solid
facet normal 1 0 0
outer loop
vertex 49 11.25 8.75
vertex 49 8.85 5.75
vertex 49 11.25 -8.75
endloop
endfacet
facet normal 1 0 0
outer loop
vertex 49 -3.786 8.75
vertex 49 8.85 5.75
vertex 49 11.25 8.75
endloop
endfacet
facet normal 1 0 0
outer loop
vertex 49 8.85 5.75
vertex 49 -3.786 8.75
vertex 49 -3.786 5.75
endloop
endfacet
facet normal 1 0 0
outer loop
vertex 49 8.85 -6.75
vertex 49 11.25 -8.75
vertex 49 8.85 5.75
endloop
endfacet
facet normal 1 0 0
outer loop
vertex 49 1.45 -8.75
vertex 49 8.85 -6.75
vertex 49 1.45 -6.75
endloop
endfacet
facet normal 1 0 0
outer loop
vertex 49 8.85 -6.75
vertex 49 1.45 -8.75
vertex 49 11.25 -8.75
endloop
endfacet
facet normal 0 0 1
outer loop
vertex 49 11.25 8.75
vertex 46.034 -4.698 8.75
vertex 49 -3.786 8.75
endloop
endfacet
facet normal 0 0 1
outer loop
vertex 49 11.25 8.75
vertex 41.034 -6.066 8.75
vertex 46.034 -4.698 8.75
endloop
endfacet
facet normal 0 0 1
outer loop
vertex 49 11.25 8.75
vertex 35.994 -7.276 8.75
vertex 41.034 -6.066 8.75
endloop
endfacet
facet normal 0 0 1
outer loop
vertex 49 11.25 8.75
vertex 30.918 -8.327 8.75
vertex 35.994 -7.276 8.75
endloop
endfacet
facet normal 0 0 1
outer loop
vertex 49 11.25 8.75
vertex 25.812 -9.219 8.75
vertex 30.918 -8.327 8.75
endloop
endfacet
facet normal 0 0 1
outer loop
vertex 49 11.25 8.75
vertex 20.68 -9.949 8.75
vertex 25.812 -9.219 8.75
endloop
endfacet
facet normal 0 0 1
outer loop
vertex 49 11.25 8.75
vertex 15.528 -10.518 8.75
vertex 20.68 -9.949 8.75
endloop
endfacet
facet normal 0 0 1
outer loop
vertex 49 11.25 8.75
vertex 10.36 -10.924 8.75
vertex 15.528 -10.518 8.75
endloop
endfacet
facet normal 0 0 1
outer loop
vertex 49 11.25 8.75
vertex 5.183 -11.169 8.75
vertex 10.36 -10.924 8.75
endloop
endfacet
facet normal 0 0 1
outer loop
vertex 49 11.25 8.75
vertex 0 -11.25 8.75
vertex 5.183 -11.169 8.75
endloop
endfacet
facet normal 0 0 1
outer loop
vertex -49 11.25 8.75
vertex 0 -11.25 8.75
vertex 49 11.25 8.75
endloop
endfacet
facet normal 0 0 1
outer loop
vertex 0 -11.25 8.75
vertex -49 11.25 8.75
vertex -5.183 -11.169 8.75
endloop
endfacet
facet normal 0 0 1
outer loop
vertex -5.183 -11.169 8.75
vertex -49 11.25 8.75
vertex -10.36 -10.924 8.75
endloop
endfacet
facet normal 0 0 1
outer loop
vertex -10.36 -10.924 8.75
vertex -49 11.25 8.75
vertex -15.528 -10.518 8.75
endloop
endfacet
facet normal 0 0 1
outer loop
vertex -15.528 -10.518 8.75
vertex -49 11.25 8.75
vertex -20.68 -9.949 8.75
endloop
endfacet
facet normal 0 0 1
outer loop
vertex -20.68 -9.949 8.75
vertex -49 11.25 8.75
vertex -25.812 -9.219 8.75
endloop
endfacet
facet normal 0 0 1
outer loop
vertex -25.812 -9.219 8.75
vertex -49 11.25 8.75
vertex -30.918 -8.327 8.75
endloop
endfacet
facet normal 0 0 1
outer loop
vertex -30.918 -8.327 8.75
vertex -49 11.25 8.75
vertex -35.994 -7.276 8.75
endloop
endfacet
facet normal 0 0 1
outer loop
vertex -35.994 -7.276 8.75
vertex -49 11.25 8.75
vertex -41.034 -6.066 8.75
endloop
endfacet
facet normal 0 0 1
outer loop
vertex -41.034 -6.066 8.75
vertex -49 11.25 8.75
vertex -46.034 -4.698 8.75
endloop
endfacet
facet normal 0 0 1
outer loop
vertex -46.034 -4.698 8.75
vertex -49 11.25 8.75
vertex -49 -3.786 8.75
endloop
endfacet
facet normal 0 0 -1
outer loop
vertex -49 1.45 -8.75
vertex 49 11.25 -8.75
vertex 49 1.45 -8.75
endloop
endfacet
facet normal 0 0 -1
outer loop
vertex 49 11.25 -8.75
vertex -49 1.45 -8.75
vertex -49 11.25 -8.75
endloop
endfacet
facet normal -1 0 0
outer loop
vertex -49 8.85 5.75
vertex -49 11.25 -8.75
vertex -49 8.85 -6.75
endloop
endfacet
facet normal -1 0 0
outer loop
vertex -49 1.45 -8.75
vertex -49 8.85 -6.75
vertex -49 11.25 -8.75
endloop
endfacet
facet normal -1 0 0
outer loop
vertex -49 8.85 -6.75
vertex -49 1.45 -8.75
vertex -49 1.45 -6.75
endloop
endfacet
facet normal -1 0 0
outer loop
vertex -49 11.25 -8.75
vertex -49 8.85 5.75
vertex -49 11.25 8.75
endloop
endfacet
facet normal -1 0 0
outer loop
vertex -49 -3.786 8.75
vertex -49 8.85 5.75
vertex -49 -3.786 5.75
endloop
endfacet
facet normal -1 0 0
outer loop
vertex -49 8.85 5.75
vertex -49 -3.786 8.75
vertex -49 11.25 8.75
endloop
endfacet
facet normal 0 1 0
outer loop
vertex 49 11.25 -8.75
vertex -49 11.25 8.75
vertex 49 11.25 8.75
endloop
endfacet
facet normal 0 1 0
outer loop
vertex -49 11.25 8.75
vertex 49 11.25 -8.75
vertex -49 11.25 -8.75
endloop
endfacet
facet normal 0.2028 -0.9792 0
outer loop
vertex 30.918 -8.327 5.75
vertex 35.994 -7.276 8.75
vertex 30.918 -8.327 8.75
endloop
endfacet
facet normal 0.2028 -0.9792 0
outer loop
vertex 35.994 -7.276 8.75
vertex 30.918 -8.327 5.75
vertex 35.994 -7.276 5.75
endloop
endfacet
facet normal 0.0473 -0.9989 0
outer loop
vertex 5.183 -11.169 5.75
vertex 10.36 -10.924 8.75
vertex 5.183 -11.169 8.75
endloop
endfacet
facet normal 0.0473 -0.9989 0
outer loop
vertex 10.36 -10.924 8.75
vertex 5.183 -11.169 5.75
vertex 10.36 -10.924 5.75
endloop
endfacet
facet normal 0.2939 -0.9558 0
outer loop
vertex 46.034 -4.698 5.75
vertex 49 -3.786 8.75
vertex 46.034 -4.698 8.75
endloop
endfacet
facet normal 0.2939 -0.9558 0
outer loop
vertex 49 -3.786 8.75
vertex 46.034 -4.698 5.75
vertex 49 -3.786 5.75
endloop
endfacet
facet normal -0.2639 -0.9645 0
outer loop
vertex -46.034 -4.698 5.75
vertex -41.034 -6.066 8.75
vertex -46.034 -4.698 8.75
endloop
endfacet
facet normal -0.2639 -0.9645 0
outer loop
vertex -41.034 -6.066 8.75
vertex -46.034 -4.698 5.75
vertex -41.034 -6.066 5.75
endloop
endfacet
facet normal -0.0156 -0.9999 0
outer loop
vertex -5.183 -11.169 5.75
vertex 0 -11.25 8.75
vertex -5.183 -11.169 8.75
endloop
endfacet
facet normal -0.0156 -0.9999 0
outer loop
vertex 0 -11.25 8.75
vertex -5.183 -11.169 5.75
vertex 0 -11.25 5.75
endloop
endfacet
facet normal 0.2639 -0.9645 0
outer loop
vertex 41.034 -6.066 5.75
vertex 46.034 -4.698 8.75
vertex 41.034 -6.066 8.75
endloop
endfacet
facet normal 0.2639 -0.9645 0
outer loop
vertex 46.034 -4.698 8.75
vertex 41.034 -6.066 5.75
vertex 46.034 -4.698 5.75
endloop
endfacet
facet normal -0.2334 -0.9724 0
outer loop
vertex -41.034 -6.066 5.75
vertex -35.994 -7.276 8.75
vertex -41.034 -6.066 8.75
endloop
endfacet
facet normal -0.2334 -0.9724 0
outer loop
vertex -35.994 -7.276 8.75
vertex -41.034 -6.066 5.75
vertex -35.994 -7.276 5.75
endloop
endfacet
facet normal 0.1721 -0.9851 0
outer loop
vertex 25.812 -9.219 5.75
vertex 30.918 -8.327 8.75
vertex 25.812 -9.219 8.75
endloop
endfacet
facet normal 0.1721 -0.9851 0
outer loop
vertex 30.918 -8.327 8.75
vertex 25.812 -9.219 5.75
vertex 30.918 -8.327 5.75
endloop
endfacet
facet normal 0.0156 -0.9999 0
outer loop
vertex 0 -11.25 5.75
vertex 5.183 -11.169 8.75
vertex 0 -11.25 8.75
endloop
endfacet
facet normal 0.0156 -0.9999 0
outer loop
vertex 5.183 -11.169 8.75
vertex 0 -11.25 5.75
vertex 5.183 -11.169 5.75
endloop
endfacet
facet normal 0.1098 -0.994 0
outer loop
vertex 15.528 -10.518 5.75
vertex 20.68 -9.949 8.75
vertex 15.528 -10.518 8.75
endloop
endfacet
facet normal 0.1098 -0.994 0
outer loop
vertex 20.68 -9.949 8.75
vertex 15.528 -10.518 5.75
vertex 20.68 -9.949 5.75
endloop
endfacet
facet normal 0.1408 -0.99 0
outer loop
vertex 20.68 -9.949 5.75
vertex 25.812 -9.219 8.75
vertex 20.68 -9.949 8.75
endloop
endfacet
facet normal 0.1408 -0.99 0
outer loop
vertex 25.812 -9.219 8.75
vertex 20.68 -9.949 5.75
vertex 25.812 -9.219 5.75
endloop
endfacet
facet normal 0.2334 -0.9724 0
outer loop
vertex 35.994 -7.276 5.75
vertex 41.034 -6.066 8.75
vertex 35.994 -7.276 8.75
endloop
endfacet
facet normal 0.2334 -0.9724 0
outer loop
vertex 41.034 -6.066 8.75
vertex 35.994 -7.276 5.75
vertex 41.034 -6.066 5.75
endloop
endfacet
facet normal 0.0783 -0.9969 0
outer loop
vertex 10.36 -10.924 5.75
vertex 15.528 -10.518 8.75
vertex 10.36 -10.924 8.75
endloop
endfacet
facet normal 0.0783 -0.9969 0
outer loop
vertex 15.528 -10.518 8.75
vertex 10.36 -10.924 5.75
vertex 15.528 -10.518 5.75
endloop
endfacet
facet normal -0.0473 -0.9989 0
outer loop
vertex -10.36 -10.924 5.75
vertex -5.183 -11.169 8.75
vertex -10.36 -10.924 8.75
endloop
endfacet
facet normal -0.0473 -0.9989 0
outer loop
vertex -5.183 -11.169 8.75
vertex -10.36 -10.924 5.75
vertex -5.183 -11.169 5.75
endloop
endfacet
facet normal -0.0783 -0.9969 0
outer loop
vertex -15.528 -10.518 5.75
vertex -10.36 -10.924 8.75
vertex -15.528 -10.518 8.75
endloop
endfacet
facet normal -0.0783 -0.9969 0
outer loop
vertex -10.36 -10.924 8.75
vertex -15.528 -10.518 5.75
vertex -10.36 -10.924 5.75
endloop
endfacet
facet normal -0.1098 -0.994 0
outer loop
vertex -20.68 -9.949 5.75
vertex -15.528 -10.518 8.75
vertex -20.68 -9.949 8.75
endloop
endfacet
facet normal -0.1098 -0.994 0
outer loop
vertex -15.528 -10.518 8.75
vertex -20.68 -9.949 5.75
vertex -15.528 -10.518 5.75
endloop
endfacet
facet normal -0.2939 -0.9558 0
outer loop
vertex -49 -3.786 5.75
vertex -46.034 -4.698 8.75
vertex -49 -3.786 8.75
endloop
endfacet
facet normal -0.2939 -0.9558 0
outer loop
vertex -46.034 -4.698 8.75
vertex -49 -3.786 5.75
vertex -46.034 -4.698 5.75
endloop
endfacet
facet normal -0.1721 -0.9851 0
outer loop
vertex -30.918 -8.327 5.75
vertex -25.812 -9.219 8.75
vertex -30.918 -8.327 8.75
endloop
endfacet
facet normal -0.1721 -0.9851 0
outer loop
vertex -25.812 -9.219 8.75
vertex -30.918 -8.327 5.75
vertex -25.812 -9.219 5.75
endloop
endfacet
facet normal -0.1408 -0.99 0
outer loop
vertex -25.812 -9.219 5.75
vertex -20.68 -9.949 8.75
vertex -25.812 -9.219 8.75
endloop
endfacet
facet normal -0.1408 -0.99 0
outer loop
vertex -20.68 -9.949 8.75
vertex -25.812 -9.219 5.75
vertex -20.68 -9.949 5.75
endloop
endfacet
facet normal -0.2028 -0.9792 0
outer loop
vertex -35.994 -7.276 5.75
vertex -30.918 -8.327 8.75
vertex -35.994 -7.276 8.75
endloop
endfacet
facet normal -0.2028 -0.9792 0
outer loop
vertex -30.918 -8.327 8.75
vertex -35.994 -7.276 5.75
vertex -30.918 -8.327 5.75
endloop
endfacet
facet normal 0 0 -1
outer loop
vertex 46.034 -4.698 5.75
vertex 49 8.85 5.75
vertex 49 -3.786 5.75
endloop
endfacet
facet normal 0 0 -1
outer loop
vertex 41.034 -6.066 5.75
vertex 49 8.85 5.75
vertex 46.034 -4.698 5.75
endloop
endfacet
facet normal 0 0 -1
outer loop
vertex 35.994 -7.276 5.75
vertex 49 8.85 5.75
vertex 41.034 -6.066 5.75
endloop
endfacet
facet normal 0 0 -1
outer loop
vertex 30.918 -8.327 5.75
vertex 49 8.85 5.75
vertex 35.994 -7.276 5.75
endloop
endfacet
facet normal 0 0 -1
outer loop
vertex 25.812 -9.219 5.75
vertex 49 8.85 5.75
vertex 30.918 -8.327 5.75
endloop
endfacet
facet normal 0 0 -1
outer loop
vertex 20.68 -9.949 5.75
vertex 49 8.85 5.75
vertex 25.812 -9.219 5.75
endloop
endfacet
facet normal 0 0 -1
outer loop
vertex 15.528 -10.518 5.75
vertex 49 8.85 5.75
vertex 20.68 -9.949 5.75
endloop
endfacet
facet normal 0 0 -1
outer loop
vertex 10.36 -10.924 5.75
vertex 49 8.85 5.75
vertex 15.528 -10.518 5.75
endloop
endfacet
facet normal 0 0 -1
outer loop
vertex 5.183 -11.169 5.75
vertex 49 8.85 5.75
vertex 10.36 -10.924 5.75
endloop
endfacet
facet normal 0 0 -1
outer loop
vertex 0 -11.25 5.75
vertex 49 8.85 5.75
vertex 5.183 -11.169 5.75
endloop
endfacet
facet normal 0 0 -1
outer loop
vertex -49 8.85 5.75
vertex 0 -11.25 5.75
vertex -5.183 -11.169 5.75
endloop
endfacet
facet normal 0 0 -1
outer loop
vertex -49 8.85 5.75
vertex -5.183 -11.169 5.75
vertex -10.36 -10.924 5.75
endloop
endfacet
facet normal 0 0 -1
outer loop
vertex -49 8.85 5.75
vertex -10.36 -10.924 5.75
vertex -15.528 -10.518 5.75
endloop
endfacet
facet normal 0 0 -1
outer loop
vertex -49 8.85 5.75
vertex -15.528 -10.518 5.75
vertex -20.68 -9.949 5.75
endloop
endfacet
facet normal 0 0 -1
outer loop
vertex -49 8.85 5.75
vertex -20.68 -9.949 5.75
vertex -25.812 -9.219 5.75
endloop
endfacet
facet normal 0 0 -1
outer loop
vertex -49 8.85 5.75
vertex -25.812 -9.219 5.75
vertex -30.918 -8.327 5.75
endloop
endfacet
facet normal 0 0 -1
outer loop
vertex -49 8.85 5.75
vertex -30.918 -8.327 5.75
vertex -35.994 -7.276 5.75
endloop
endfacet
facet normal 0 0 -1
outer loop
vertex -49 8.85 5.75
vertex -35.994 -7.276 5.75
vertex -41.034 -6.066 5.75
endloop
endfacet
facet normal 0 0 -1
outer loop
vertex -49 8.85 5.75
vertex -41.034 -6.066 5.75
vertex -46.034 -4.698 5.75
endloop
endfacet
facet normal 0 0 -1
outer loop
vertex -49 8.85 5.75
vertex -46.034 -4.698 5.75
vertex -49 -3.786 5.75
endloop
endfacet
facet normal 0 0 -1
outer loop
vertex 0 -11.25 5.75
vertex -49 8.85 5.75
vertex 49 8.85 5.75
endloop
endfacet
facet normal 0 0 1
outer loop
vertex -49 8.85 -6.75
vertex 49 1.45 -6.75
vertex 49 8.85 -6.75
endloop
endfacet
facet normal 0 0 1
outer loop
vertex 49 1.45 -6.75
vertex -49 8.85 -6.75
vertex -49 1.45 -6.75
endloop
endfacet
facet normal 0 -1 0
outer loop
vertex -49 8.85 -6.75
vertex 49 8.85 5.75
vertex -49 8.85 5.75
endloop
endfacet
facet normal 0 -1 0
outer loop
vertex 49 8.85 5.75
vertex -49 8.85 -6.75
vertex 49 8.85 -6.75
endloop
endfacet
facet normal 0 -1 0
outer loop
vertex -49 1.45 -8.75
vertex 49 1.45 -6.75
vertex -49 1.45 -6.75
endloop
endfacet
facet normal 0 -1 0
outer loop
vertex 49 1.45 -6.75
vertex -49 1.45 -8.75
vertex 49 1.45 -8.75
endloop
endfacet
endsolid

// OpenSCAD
// Handle for a food tray

// On this, x = length, y = depth, z = height;

main_length = 98;
main_height = 17.5;
main_depth = 22.5;
round_radius = 165;

grip_length = 9.8;

// The thickness of the curved side
th_curved = 3;
// The thickness of the "bottom" of the form.
th_bottom = 2.4;
// And, the thickness of the last side
th_grip = 2;


pad = 0.5;

$fn = 200;

// The major part
module part() {
    intersection() {
        cube([main_length, main_depth, main_height], center = true);
        translate([0,round_radius-main_depth/2.0,0])
           cylinder(r = round_radius, h = round_radius, center = true);
    }
}

// The cutter to make the main form
module cutter() {
    // The main "hole"
    translate([0,-th_bottom,(th_grip - th_curved)/2.0])
    # cube([main_length + pad, main_depth, main_height  - th_curved - th_grip], center = true);
    // Cutting into the grip
    translate([0,-grip_length,-main_height / 2])
    cube([main_length + pad, main_depth, main_height], center = true);
}

module main() {
    difference() {
        part();
        cutter();
    }
    
}


main();
